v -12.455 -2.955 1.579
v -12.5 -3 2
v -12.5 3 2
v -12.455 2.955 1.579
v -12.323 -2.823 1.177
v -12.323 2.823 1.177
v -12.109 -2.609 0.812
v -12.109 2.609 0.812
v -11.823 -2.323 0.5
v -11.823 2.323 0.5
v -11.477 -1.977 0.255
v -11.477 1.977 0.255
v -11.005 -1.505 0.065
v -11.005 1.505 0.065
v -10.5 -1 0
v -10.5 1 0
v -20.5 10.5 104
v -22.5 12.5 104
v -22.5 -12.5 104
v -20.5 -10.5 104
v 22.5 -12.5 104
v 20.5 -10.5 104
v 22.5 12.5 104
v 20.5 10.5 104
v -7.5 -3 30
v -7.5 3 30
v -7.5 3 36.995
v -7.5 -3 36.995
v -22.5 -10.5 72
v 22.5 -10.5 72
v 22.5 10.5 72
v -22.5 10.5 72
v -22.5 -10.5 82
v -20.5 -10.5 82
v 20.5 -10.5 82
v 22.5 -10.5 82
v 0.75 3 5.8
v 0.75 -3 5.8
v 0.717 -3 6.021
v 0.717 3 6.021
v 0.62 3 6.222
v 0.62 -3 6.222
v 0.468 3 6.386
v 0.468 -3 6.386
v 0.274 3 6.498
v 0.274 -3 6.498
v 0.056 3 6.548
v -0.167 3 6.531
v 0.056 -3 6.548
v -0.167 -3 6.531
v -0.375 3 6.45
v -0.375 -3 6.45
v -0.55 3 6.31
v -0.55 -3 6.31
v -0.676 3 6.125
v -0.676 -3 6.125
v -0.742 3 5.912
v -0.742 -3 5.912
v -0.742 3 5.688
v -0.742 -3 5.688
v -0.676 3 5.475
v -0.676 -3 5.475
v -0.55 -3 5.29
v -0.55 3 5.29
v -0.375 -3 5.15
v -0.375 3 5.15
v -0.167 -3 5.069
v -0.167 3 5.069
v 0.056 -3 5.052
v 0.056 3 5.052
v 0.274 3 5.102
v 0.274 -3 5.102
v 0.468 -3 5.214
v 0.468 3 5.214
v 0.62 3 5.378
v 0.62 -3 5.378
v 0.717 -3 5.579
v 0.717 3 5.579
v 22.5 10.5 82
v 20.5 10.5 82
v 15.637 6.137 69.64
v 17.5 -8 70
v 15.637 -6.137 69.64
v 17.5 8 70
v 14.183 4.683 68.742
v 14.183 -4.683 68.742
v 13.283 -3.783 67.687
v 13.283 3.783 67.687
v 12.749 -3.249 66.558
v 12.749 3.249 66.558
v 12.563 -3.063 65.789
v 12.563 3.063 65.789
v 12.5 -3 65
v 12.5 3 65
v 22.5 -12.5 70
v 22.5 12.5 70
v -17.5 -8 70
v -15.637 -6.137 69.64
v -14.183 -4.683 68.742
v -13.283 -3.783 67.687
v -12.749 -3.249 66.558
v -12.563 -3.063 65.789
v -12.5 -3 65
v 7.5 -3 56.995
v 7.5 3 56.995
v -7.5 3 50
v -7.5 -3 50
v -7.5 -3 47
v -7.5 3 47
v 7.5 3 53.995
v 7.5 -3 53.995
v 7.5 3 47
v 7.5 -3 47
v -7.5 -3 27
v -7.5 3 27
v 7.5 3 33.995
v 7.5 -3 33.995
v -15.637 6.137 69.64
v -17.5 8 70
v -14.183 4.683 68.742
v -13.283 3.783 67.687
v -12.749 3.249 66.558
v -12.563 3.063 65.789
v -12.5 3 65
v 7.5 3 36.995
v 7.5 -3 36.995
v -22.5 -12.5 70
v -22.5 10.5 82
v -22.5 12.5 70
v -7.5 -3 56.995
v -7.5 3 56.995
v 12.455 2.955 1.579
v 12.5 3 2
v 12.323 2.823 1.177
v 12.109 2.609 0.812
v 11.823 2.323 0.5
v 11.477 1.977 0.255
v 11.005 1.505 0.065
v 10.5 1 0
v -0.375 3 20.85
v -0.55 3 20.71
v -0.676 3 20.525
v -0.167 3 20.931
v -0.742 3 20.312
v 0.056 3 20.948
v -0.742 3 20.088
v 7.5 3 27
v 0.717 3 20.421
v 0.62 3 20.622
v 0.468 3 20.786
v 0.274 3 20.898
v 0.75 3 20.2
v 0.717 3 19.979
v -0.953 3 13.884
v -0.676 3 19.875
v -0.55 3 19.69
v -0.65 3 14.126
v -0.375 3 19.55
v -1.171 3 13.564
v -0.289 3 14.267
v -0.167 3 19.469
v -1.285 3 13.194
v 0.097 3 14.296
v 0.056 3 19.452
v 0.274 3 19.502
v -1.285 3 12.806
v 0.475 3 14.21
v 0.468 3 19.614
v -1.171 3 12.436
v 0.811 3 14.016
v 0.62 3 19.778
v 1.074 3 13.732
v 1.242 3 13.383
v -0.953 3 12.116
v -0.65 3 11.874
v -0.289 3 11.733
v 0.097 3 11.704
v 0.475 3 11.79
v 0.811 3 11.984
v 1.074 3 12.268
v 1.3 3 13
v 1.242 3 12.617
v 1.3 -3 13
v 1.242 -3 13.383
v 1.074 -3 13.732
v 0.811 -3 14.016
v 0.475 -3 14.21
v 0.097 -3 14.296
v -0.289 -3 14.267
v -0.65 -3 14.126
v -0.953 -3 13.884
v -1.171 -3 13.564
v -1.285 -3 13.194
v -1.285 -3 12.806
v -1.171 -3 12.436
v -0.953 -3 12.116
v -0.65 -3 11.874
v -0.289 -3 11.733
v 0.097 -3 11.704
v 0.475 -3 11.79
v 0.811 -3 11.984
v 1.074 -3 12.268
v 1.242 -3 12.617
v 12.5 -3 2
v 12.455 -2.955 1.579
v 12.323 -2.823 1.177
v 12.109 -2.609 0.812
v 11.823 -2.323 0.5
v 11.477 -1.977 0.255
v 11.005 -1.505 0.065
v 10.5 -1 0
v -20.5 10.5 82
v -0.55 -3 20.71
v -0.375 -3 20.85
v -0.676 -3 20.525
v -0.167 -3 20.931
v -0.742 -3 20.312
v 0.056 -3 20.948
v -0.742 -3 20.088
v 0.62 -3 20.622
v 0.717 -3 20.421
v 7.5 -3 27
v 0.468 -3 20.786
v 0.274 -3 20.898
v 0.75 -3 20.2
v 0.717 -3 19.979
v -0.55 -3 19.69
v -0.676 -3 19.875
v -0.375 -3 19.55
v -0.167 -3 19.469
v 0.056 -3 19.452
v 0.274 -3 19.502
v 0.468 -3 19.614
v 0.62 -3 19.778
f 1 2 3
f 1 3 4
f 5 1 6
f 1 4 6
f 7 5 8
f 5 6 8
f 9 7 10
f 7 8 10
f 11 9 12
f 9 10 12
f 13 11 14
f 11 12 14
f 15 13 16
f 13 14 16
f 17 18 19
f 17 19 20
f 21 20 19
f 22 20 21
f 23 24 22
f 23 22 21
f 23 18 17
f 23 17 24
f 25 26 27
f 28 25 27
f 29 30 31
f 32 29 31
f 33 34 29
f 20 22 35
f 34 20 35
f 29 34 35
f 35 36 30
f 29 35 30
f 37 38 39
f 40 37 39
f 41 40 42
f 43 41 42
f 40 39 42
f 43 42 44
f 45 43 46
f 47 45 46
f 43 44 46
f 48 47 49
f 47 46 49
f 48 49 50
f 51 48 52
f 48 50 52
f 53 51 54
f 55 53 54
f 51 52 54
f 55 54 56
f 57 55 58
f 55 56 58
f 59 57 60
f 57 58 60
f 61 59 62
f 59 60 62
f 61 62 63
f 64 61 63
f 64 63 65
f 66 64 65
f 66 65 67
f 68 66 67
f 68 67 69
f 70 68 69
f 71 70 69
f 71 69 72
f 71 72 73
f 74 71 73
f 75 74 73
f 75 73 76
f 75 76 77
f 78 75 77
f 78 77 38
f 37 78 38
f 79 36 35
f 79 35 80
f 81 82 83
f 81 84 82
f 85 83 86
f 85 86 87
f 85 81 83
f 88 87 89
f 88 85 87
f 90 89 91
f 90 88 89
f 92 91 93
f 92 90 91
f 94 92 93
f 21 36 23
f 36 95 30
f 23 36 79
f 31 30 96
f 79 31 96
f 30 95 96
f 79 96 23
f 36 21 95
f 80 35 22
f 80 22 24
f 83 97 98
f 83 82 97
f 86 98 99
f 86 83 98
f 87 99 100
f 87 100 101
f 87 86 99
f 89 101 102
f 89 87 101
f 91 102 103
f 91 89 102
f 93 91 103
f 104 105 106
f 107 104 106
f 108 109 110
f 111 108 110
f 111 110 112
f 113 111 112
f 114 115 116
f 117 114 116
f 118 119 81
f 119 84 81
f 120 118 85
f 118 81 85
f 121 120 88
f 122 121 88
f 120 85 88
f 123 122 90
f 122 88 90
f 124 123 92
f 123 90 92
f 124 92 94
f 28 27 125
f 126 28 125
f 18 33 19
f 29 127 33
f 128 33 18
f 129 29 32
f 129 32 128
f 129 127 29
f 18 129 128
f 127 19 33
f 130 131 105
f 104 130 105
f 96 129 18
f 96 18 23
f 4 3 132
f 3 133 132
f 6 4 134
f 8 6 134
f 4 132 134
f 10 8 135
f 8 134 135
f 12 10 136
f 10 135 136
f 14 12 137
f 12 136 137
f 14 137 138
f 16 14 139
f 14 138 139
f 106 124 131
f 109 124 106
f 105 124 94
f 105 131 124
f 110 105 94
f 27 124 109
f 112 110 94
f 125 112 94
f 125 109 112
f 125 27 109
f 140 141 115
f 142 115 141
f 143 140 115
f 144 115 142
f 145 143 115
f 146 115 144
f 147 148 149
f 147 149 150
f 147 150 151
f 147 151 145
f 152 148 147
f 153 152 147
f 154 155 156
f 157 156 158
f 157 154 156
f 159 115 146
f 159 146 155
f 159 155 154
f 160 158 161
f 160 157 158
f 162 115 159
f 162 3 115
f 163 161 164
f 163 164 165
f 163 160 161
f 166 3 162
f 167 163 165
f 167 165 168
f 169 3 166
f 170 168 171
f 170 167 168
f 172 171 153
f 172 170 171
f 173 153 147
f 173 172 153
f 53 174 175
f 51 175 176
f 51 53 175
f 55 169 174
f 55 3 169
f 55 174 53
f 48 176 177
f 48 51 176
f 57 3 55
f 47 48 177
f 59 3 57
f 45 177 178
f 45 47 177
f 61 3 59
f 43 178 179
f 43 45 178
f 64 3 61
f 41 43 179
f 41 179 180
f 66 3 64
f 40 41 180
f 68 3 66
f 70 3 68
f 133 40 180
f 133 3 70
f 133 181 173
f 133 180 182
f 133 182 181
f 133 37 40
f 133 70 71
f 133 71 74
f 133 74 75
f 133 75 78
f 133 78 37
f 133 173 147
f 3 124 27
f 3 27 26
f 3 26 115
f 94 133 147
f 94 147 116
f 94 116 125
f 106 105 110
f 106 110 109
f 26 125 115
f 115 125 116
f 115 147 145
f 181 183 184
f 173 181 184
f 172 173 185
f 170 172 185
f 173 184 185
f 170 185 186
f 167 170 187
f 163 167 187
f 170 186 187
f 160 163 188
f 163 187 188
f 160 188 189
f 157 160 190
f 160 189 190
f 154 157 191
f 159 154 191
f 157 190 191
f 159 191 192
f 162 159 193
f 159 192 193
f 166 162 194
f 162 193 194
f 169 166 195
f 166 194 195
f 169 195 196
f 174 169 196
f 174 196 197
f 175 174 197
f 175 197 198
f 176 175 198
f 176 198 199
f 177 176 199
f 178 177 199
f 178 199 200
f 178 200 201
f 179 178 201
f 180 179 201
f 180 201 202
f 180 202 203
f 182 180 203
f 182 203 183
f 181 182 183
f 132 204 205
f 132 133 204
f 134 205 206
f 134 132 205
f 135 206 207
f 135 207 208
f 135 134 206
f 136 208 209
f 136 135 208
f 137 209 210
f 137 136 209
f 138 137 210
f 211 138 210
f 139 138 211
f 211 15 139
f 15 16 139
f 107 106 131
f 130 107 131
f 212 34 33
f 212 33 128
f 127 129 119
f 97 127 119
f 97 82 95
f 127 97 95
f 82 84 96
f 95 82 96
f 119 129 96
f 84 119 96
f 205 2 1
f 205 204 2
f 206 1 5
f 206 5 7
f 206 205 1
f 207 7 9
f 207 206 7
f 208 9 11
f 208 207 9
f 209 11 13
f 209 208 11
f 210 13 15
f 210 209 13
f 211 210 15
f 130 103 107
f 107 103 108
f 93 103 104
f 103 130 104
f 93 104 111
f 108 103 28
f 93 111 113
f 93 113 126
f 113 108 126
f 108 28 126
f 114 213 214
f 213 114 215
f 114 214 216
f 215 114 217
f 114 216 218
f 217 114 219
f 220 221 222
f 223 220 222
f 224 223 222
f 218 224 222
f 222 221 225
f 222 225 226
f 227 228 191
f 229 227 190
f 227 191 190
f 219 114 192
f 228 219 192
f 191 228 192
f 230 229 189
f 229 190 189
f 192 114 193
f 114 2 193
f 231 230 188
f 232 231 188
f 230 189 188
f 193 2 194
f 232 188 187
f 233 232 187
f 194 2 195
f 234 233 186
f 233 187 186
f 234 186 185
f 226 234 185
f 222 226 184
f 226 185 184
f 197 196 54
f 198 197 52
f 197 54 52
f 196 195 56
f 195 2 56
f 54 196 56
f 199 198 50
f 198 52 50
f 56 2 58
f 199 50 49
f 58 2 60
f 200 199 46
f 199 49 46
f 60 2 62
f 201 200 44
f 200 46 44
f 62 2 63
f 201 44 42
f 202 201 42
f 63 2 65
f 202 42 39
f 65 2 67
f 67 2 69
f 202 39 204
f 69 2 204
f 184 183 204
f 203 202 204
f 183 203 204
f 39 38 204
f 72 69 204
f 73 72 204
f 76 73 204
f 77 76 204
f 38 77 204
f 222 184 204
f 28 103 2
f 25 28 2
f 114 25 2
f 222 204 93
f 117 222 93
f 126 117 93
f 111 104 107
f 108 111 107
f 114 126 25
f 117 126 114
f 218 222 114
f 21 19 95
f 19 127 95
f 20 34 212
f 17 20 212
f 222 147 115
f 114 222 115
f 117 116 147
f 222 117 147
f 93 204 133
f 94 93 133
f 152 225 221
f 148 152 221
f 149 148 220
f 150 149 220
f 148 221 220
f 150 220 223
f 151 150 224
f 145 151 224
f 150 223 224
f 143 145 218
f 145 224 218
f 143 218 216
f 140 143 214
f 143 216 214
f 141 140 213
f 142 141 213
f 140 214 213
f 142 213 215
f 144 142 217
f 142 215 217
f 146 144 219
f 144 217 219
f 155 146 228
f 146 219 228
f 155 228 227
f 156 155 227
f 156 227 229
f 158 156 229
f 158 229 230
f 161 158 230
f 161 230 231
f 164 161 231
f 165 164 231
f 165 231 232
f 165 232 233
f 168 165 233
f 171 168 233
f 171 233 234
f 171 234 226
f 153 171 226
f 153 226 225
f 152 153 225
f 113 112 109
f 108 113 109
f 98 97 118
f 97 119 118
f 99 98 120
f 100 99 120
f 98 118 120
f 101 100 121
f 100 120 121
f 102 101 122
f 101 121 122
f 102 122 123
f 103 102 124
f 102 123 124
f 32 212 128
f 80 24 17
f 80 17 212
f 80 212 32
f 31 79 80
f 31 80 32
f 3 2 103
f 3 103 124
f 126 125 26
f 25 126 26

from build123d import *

# Parameters (mm, degrees)
SKETCH1_W           = 25
SKETCH1_H           = 6
BOSS_EXTRUDE1_DEPTH = 70
FILLET1_R           = 2
CUT_EXTRUDE1_DEPTH  = 6
LPATTERN1_COUNT     = 3
LPATTERN1_PITCH     = 20
SKETCH3_W           = 15
SKETCH3_H           = 9.994614872
BOSS_EXTRUDE4_DEPTH = 6
SKETCH4_W           = 45
SKETCH4_H           = 25
BOSS_EXTRUDE5_DEPTH = 2
SKETCH5_W           = 45
SKETCH5_H           = 25
SKETCH5_W_2         = 41
SKETCH5_H_2         = 21
BOSS_EXTRUDE6_DEPTH = 32
FILLET2_R           = 5
SKETCH8_W           = 10
SKETCH8_H           = 21
CUT_EXTRUDE2_DEPTH  = 45
CUT_EXTRUDE3_REACH  = 17.5
SKETCH9_R           = 1.3
SKETCH9_R_2         = 0.75


with BuildPart() as part:
    # Sketch1 → Boss-Extrude1 (new body)
    with BuildSketch(Plane.XY):
        Rectangle(SKETCH1_W, SKETCH1_H)
    extrude(amount=BOSS_EXTRUDE1_DEPTH)

    # Fillet1
    fillet1_edges = [part.edges().sort_by_distance(p)[0] for p in [
        (0, -3, 0),
        (-12.5, 0, 0),
        (0, 3, 0),
        (12.5, 0, 0),
    ]]
    fillet(fillet1_edges, radius=FILLET1_R)

    # Sketch2 → Cut-Extrude1 (cut)
    with BuildSketch(Plane(origin=(0, 3, 0), x_dir=(1, 0, 0), z_dir=(0, 1, 0))):
        Polygon((7.5, -16.994614872), (-7.5, -10), (-7.5, -16.994614872), align=None)
        Polygon((7.5, -13.994614872), (7.5, -7), (-7.5, -7), align=None)
    cut_extrude1 = extrude(amount=-CUT_EXTRUDE1_DEPTH, mode=Mode.SUBTRACT)

    # LPattern1: Cut-Extrude1 ×3
    with Locations(*[(0, 0, i * LPATTERN1_PITCH) for i in range(1, LPATTERN1_COUNT)]):
        add(cut_extrude1, mode=Mode.SUBTRACT)

    # Sketch3 → Boss-Extrude4 (add)
    with BuildSketch(Plane(origin=(0, 3, 0), x_dir=(1, 0, 0), z_dir=(0, 1, 0))):
        with Locations((0, -11.997307436)):
            Rectangle(SKETCH3_W, SKETCH3_H)
    extrude(amount=-BOSS_EXTRUDE4_DEPTH)

    # Sketch4 → Boss-Extrude5 (add)
    with BuildSketch(Plane.XY.offset(70)):
        Rectangle(SKETCH4_W, SKETCH4_H)
    extrude(amount=BOSS_EXTRUDE5_DEPTH)

    # Sketch5 → Boss-Extrude6 (add)
    with BuildSketch(Plane.XY.offset(72)):
        Rectangle(SKETCH5_W, SKETCH5_H)
        Rectangle(SKETCH5_W_2, SKETCH5_H_2, mode=Mode.SUBTRACT)
    extrude(amount=BOSS_EXTRUDE6_DEPTH)

    # Fillet2
    fillet2_edges = [part.edges().sort_by_distance(p)[0] for p in [
        (-12.5, 0, 70),
        (0, -3, 70),
        (12.5, 0, 70),
        (0, 3, 70),
    ]]
    fillet(fillet2_edges, radius=FILLET2_R)

    # Sketch8 → Cut-Extrude2 (cut)
    with BuildSketch(Plane(origin=(22.5, 0, 0), x_dir=(0, 0, -1), z_dir=(1, 0, 0))):
        with Locations((-77, 0)):
            Rectangle(SKETCH8_W, SKETCH8_H)
    extrude(amount=-CUT_EXTRUDE2_DEPTH, mode=Mode.SUBTRACT)

    # Sketch9 → Cut-Extrude3 (cut, up to next)
    with BuildSketch(Plane.XZ.offset(3), mode=Mode.PRIVATE) as cut_extrude3_sk1:
        with Locations((0, 13)):
            Circle(SKETCH9_R)
    cut_extrude3_tool1 = extrude(cut_extrude3_sk1.sketch, amount=-CUT_EXTRUDE3_REACH, mode=Mode.PRIVATE) & part.part
    add(cut_extrude3_tool1.solids().sort_by_distance((0, -3, 13))[0], mode=Mode.SUBTRACT)
    # Sketch9 → Cut-Extrude3 (cut, up to next)
    with BuildSketch(Plane.XZ.offset(3), mode=Mode.PRIVATE) as cut_extrude3_sk2:
        with Locations((0, 20.2)):
            Circle(SKETCH9_R_2)
    cut_extrude3_tool2 = extrude(cut_extrude3_sk2.sketch, amount=-CUT_EXTRUDE3_REACH, mode=Mode.PRIVATE) & part.part
    add(cut_extrude3_tool2.solids().sort_by_distance((0, -3, 20.2))[0], mode=Mode.SUBTRACT)
    # Sketch9 → Cut-Extrude3 (cut, up to next)
    with BuildSketch(Plane.XZ.offset(3), mode=Mode.PRIVATE) as cut_extrude3_sk3:
        with Locations((0, 5.8)):
            Circle(SKETCH9_R_2)
    cut_extrude3_tool3 = extrude(cut_extrude3_sk3.sketch, amount=-CUT_EXTRUDE3_REACH, mode=Mode.PRIVATE) & part.part
    add(cut_extrude3_tool3.solids().sort_by_distance((0, -3, 5.8))[0], mode=Mode.SUBTRACT)


solid = part.part
